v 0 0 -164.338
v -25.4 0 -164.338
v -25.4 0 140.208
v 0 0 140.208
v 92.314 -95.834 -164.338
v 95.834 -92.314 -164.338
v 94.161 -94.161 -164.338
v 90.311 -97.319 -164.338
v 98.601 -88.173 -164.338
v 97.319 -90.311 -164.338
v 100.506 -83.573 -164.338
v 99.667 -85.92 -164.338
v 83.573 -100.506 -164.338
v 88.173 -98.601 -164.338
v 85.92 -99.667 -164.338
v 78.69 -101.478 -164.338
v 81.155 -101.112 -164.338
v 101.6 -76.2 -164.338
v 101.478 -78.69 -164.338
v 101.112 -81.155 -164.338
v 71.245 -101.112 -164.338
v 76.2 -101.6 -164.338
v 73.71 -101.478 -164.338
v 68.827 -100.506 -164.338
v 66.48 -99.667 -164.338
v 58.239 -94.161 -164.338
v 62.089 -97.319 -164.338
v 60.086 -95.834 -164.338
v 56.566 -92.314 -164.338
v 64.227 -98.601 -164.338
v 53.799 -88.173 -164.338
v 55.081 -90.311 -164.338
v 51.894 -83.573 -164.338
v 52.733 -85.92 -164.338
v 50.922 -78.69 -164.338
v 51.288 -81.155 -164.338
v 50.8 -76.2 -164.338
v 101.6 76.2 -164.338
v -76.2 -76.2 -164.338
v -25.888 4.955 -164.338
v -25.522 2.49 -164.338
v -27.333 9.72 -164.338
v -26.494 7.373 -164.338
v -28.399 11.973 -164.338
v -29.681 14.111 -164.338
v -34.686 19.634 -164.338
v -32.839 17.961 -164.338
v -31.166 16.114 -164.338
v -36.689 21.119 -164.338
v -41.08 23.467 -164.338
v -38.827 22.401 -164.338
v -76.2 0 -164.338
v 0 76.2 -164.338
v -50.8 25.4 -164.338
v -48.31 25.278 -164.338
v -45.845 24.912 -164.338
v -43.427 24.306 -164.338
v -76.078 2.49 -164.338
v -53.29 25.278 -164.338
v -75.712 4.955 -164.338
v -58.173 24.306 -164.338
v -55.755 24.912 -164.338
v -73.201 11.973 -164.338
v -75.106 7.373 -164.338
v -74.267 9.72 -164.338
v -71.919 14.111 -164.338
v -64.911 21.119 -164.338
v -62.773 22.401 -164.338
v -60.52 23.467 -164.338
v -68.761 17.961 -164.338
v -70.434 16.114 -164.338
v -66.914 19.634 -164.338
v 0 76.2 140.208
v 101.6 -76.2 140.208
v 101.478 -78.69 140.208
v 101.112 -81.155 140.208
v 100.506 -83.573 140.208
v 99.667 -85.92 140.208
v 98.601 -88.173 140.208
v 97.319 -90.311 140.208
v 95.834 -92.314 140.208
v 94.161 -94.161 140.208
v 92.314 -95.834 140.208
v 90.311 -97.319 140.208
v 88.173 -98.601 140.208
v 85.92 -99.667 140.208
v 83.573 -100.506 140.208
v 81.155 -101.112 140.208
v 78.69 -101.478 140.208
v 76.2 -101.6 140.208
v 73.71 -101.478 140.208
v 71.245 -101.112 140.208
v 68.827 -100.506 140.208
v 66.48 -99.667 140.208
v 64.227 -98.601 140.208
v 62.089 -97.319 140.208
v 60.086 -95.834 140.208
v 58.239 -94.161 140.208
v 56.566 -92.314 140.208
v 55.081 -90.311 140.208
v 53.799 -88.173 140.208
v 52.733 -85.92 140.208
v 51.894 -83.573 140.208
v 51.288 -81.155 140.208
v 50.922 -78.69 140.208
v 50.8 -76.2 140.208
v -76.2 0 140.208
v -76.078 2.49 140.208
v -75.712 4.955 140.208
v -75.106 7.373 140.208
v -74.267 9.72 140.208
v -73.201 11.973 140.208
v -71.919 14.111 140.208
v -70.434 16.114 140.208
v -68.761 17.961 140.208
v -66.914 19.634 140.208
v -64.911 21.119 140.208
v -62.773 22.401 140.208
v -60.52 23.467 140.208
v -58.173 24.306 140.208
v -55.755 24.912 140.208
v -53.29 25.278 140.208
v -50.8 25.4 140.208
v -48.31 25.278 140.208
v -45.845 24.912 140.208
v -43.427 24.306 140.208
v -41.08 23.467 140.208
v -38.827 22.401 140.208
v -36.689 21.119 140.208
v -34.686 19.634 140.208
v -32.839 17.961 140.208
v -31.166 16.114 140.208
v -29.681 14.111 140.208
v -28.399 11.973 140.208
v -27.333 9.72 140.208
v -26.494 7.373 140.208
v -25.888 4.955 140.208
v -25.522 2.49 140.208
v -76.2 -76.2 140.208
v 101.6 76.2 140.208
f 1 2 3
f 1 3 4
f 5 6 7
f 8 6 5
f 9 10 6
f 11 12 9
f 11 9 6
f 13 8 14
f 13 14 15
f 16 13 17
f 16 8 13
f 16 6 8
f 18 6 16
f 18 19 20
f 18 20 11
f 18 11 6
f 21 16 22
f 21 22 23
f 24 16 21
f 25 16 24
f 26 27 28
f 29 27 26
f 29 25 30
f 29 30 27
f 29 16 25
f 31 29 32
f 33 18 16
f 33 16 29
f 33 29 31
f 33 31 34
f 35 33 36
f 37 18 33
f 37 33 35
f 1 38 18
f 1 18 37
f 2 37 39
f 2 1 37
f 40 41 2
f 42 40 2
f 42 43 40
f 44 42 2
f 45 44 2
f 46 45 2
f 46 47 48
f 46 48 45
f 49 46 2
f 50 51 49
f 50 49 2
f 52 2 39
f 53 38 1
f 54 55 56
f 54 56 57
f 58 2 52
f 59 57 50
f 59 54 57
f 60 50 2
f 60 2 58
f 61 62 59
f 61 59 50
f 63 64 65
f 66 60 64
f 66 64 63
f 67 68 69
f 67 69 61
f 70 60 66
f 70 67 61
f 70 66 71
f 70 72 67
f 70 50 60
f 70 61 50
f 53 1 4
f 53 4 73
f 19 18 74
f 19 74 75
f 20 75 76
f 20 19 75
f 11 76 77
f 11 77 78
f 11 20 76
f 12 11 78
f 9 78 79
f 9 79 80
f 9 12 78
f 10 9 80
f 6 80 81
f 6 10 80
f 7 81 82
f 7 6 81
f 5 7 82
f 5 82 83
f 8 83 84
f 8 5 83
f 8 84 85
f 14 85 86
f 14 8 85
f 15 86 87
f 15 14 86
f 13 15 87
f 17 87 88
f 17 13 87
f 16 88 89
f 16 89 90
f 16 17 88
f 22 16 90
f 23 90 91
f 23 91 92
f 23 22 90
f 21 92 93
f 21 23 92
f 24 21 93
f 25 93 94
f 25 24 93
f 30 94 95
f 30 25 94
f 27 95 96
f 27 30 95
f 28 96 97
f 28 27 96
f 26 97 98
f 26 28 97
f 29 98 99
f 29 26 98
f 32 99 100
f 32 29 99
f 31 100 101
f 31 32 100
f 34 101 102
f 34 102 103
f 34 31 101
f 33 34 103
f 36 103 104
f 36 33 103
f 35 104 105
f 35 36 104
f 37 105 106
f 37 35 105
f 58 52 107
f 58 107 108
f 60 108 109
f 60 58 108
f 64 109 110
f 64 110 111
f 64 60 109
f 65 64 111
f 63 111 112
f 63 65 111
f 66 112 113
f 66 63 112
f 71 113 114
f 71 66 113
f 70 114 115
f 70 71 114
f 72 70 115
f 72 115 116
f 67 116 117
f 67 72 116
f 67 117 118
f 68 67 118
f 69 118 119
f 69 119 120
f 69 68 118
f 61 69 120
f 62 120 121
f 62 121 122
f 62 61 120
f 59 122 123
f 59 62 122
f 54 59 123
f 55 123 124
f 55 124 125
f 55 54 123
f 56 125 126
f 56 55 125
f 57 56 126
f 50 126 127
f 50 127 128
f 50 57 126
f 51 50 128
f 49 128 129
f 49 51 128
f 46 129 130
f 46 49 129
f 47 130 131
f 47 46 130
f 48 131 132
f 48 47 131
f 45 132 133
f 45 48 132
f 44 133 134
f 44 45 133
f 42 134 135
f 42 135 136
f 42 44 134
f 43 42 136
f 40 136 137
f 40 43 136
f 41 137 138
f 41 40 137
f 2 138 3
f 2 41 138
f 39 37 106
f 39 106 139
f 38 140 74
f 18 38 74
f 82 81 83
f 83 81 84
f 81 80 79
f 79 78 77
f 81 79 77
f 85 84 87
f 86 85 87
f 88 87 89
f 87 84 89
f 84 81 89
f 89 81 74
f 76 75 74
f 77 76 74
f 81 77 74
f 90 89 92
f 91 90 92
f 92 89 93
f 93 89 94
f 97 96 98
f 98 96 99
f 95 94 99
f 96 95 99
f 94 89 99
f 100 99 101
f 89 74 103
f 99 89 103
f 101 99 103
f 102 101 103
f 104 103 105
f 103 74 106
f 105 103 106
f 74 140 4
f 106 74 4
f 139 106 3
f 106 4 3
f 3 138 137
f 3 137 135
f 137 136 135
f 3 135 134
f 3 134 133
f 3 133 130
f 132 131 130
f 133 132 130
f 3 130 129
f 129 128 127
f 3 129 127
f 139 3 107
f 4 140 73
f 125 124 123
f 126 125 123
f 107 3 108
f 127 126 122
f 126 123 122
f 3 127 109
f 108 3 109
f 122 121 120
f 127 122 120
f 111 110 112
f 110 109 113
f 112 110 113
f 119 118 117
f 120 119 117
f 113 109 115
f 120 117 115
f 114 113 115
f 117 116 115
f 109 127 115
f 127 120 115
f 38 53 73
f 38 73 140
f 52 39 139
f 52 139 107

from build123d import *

# Parameters (mm, degrees)
BOSS_EXTRUDE1_DEPTH      = 140.208
BOSS_EXTRUDE1_DEPTH_BACK = 164.338


with BuildPart() as part:
    # First Part → Boss-Extrude1 (new, two sides: drawn at the far end of the back side and taken through both)
    with BuildSketch(Plane.XY.offset(-BOSS_EXTRUDE1_DEPTH_BACK)):
        with BuildLine():
            Line((0, 0), (0, 76.2))
            Line((0, 76.2), (101.6, 76.2))
            Line((101.6, 76.2), (101.6, -76.2))
            ThreePointArc((101.6, -76.2), (76.2, -101.6), (50.8, -76.2))
            Line((50.8, -76.2), (-76.2, -76.2))
            Line((-76.2, -76.2), (-76.2, 0))
            ThreePointArc((-76.2, 0), (-50.8, 25.4), (-25.4, 0))
            Line((-25.4, 0), (0, 0))
        make_face()
    extrude(amount=BOSS_EXTRUDE1_DEPTH + BOSS_EXTRUDE1_DEPTH_BACK)


solid = part.part
